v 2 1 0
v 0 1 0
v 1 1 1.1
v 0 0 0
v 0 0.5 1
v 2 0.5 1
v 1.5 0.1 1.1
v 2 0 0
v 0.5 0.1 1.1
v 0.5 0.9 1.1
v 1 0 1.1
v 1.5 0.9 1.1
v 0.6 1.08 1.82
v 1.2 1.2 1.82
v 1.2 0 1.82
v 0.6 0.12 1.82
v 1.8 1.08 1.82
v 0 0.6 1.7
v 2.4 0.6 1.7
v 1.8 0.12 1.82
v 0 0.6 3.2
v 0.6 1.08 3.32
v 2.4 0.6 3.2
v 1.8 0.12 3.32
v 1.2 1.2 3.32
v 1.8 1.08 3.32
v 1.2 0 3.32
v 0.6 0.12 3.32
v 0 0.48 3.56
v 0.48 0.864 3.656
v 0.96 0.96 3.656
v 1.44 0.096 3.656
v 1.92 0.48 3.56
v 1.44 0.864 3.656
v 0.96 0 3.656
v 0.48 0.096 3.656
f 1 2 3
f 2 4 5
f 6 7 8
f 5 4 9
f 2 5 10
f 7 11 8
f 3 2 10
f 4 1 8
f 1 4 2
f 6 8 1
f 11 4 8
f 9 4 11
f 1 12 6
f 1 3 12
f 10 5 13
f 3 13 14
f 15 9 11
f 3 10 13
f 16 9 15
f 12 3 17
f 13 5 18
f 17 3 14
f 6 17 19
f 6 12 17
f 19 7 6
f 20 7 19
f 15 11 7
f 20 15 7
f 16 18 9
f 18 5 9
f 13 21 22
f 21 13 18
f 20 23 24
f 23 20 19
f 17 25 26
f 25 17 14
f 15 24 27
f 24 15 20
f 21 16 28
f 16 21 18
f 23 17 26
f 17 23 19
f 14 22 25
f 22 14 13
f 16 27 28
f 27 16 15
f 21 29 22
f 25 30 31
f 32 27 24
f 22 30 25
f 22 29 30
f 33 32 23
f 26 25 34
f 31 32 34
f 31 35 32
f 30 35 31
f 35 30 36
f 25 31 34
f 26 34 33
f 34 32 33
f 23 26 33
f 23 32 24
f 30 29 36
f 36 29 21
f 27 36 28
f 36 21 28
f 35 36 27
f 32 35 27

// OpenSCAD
sixring=[[0,0,0],[1,0,0.1],[2,0,0],[2,1,0],[1,1,0.1],[0,1,0]];
octring=[[0.5,0.1,1.1],[1,0 ,1.1],[1.5,0.1,1.1],[2,0.5,1 ],[1.5,0.9,1.1],[1,1,1.1],[0.5,0.9,1.1],[0,0.5,1]];
octring2=octring *1.2 +[for(i=[1:len(octring)])[0,0,0.5]];
octring3=octring2 *1  +[for(i=[1:len(octring)])[0,0,1.5]];
octring4=octring3 *0.8  +[for(i=[1:len(octring)])[0,0,1]];
hull(){
polyhedron(sixring,[[0,1,2,3,4,5]]
);

polyhedron(octring,[[0,1,2,3,4,5,6,7]]
); };


hull(){
    polyhedron(octring,[[0,1,2,3,4,5,6,7]]
);
polyhedron(octring2,[[0,1,2,3,4,5,6,7]]
);
   };
  
   hull(){
    polyhedron(octring2,[[0,1,2,3,4,5,6,7]]
);
polyhedron(octring3,[[0,1,2,3,4,5,6,7]]
);
   }; 
    
 hull(){   
    polyhedron(octring3,[[0,1,2,3,4,5,6,7]]
);
    polyhedron(octring4,[[0,1,2,3,4,5,6,7]]
);
};
   
